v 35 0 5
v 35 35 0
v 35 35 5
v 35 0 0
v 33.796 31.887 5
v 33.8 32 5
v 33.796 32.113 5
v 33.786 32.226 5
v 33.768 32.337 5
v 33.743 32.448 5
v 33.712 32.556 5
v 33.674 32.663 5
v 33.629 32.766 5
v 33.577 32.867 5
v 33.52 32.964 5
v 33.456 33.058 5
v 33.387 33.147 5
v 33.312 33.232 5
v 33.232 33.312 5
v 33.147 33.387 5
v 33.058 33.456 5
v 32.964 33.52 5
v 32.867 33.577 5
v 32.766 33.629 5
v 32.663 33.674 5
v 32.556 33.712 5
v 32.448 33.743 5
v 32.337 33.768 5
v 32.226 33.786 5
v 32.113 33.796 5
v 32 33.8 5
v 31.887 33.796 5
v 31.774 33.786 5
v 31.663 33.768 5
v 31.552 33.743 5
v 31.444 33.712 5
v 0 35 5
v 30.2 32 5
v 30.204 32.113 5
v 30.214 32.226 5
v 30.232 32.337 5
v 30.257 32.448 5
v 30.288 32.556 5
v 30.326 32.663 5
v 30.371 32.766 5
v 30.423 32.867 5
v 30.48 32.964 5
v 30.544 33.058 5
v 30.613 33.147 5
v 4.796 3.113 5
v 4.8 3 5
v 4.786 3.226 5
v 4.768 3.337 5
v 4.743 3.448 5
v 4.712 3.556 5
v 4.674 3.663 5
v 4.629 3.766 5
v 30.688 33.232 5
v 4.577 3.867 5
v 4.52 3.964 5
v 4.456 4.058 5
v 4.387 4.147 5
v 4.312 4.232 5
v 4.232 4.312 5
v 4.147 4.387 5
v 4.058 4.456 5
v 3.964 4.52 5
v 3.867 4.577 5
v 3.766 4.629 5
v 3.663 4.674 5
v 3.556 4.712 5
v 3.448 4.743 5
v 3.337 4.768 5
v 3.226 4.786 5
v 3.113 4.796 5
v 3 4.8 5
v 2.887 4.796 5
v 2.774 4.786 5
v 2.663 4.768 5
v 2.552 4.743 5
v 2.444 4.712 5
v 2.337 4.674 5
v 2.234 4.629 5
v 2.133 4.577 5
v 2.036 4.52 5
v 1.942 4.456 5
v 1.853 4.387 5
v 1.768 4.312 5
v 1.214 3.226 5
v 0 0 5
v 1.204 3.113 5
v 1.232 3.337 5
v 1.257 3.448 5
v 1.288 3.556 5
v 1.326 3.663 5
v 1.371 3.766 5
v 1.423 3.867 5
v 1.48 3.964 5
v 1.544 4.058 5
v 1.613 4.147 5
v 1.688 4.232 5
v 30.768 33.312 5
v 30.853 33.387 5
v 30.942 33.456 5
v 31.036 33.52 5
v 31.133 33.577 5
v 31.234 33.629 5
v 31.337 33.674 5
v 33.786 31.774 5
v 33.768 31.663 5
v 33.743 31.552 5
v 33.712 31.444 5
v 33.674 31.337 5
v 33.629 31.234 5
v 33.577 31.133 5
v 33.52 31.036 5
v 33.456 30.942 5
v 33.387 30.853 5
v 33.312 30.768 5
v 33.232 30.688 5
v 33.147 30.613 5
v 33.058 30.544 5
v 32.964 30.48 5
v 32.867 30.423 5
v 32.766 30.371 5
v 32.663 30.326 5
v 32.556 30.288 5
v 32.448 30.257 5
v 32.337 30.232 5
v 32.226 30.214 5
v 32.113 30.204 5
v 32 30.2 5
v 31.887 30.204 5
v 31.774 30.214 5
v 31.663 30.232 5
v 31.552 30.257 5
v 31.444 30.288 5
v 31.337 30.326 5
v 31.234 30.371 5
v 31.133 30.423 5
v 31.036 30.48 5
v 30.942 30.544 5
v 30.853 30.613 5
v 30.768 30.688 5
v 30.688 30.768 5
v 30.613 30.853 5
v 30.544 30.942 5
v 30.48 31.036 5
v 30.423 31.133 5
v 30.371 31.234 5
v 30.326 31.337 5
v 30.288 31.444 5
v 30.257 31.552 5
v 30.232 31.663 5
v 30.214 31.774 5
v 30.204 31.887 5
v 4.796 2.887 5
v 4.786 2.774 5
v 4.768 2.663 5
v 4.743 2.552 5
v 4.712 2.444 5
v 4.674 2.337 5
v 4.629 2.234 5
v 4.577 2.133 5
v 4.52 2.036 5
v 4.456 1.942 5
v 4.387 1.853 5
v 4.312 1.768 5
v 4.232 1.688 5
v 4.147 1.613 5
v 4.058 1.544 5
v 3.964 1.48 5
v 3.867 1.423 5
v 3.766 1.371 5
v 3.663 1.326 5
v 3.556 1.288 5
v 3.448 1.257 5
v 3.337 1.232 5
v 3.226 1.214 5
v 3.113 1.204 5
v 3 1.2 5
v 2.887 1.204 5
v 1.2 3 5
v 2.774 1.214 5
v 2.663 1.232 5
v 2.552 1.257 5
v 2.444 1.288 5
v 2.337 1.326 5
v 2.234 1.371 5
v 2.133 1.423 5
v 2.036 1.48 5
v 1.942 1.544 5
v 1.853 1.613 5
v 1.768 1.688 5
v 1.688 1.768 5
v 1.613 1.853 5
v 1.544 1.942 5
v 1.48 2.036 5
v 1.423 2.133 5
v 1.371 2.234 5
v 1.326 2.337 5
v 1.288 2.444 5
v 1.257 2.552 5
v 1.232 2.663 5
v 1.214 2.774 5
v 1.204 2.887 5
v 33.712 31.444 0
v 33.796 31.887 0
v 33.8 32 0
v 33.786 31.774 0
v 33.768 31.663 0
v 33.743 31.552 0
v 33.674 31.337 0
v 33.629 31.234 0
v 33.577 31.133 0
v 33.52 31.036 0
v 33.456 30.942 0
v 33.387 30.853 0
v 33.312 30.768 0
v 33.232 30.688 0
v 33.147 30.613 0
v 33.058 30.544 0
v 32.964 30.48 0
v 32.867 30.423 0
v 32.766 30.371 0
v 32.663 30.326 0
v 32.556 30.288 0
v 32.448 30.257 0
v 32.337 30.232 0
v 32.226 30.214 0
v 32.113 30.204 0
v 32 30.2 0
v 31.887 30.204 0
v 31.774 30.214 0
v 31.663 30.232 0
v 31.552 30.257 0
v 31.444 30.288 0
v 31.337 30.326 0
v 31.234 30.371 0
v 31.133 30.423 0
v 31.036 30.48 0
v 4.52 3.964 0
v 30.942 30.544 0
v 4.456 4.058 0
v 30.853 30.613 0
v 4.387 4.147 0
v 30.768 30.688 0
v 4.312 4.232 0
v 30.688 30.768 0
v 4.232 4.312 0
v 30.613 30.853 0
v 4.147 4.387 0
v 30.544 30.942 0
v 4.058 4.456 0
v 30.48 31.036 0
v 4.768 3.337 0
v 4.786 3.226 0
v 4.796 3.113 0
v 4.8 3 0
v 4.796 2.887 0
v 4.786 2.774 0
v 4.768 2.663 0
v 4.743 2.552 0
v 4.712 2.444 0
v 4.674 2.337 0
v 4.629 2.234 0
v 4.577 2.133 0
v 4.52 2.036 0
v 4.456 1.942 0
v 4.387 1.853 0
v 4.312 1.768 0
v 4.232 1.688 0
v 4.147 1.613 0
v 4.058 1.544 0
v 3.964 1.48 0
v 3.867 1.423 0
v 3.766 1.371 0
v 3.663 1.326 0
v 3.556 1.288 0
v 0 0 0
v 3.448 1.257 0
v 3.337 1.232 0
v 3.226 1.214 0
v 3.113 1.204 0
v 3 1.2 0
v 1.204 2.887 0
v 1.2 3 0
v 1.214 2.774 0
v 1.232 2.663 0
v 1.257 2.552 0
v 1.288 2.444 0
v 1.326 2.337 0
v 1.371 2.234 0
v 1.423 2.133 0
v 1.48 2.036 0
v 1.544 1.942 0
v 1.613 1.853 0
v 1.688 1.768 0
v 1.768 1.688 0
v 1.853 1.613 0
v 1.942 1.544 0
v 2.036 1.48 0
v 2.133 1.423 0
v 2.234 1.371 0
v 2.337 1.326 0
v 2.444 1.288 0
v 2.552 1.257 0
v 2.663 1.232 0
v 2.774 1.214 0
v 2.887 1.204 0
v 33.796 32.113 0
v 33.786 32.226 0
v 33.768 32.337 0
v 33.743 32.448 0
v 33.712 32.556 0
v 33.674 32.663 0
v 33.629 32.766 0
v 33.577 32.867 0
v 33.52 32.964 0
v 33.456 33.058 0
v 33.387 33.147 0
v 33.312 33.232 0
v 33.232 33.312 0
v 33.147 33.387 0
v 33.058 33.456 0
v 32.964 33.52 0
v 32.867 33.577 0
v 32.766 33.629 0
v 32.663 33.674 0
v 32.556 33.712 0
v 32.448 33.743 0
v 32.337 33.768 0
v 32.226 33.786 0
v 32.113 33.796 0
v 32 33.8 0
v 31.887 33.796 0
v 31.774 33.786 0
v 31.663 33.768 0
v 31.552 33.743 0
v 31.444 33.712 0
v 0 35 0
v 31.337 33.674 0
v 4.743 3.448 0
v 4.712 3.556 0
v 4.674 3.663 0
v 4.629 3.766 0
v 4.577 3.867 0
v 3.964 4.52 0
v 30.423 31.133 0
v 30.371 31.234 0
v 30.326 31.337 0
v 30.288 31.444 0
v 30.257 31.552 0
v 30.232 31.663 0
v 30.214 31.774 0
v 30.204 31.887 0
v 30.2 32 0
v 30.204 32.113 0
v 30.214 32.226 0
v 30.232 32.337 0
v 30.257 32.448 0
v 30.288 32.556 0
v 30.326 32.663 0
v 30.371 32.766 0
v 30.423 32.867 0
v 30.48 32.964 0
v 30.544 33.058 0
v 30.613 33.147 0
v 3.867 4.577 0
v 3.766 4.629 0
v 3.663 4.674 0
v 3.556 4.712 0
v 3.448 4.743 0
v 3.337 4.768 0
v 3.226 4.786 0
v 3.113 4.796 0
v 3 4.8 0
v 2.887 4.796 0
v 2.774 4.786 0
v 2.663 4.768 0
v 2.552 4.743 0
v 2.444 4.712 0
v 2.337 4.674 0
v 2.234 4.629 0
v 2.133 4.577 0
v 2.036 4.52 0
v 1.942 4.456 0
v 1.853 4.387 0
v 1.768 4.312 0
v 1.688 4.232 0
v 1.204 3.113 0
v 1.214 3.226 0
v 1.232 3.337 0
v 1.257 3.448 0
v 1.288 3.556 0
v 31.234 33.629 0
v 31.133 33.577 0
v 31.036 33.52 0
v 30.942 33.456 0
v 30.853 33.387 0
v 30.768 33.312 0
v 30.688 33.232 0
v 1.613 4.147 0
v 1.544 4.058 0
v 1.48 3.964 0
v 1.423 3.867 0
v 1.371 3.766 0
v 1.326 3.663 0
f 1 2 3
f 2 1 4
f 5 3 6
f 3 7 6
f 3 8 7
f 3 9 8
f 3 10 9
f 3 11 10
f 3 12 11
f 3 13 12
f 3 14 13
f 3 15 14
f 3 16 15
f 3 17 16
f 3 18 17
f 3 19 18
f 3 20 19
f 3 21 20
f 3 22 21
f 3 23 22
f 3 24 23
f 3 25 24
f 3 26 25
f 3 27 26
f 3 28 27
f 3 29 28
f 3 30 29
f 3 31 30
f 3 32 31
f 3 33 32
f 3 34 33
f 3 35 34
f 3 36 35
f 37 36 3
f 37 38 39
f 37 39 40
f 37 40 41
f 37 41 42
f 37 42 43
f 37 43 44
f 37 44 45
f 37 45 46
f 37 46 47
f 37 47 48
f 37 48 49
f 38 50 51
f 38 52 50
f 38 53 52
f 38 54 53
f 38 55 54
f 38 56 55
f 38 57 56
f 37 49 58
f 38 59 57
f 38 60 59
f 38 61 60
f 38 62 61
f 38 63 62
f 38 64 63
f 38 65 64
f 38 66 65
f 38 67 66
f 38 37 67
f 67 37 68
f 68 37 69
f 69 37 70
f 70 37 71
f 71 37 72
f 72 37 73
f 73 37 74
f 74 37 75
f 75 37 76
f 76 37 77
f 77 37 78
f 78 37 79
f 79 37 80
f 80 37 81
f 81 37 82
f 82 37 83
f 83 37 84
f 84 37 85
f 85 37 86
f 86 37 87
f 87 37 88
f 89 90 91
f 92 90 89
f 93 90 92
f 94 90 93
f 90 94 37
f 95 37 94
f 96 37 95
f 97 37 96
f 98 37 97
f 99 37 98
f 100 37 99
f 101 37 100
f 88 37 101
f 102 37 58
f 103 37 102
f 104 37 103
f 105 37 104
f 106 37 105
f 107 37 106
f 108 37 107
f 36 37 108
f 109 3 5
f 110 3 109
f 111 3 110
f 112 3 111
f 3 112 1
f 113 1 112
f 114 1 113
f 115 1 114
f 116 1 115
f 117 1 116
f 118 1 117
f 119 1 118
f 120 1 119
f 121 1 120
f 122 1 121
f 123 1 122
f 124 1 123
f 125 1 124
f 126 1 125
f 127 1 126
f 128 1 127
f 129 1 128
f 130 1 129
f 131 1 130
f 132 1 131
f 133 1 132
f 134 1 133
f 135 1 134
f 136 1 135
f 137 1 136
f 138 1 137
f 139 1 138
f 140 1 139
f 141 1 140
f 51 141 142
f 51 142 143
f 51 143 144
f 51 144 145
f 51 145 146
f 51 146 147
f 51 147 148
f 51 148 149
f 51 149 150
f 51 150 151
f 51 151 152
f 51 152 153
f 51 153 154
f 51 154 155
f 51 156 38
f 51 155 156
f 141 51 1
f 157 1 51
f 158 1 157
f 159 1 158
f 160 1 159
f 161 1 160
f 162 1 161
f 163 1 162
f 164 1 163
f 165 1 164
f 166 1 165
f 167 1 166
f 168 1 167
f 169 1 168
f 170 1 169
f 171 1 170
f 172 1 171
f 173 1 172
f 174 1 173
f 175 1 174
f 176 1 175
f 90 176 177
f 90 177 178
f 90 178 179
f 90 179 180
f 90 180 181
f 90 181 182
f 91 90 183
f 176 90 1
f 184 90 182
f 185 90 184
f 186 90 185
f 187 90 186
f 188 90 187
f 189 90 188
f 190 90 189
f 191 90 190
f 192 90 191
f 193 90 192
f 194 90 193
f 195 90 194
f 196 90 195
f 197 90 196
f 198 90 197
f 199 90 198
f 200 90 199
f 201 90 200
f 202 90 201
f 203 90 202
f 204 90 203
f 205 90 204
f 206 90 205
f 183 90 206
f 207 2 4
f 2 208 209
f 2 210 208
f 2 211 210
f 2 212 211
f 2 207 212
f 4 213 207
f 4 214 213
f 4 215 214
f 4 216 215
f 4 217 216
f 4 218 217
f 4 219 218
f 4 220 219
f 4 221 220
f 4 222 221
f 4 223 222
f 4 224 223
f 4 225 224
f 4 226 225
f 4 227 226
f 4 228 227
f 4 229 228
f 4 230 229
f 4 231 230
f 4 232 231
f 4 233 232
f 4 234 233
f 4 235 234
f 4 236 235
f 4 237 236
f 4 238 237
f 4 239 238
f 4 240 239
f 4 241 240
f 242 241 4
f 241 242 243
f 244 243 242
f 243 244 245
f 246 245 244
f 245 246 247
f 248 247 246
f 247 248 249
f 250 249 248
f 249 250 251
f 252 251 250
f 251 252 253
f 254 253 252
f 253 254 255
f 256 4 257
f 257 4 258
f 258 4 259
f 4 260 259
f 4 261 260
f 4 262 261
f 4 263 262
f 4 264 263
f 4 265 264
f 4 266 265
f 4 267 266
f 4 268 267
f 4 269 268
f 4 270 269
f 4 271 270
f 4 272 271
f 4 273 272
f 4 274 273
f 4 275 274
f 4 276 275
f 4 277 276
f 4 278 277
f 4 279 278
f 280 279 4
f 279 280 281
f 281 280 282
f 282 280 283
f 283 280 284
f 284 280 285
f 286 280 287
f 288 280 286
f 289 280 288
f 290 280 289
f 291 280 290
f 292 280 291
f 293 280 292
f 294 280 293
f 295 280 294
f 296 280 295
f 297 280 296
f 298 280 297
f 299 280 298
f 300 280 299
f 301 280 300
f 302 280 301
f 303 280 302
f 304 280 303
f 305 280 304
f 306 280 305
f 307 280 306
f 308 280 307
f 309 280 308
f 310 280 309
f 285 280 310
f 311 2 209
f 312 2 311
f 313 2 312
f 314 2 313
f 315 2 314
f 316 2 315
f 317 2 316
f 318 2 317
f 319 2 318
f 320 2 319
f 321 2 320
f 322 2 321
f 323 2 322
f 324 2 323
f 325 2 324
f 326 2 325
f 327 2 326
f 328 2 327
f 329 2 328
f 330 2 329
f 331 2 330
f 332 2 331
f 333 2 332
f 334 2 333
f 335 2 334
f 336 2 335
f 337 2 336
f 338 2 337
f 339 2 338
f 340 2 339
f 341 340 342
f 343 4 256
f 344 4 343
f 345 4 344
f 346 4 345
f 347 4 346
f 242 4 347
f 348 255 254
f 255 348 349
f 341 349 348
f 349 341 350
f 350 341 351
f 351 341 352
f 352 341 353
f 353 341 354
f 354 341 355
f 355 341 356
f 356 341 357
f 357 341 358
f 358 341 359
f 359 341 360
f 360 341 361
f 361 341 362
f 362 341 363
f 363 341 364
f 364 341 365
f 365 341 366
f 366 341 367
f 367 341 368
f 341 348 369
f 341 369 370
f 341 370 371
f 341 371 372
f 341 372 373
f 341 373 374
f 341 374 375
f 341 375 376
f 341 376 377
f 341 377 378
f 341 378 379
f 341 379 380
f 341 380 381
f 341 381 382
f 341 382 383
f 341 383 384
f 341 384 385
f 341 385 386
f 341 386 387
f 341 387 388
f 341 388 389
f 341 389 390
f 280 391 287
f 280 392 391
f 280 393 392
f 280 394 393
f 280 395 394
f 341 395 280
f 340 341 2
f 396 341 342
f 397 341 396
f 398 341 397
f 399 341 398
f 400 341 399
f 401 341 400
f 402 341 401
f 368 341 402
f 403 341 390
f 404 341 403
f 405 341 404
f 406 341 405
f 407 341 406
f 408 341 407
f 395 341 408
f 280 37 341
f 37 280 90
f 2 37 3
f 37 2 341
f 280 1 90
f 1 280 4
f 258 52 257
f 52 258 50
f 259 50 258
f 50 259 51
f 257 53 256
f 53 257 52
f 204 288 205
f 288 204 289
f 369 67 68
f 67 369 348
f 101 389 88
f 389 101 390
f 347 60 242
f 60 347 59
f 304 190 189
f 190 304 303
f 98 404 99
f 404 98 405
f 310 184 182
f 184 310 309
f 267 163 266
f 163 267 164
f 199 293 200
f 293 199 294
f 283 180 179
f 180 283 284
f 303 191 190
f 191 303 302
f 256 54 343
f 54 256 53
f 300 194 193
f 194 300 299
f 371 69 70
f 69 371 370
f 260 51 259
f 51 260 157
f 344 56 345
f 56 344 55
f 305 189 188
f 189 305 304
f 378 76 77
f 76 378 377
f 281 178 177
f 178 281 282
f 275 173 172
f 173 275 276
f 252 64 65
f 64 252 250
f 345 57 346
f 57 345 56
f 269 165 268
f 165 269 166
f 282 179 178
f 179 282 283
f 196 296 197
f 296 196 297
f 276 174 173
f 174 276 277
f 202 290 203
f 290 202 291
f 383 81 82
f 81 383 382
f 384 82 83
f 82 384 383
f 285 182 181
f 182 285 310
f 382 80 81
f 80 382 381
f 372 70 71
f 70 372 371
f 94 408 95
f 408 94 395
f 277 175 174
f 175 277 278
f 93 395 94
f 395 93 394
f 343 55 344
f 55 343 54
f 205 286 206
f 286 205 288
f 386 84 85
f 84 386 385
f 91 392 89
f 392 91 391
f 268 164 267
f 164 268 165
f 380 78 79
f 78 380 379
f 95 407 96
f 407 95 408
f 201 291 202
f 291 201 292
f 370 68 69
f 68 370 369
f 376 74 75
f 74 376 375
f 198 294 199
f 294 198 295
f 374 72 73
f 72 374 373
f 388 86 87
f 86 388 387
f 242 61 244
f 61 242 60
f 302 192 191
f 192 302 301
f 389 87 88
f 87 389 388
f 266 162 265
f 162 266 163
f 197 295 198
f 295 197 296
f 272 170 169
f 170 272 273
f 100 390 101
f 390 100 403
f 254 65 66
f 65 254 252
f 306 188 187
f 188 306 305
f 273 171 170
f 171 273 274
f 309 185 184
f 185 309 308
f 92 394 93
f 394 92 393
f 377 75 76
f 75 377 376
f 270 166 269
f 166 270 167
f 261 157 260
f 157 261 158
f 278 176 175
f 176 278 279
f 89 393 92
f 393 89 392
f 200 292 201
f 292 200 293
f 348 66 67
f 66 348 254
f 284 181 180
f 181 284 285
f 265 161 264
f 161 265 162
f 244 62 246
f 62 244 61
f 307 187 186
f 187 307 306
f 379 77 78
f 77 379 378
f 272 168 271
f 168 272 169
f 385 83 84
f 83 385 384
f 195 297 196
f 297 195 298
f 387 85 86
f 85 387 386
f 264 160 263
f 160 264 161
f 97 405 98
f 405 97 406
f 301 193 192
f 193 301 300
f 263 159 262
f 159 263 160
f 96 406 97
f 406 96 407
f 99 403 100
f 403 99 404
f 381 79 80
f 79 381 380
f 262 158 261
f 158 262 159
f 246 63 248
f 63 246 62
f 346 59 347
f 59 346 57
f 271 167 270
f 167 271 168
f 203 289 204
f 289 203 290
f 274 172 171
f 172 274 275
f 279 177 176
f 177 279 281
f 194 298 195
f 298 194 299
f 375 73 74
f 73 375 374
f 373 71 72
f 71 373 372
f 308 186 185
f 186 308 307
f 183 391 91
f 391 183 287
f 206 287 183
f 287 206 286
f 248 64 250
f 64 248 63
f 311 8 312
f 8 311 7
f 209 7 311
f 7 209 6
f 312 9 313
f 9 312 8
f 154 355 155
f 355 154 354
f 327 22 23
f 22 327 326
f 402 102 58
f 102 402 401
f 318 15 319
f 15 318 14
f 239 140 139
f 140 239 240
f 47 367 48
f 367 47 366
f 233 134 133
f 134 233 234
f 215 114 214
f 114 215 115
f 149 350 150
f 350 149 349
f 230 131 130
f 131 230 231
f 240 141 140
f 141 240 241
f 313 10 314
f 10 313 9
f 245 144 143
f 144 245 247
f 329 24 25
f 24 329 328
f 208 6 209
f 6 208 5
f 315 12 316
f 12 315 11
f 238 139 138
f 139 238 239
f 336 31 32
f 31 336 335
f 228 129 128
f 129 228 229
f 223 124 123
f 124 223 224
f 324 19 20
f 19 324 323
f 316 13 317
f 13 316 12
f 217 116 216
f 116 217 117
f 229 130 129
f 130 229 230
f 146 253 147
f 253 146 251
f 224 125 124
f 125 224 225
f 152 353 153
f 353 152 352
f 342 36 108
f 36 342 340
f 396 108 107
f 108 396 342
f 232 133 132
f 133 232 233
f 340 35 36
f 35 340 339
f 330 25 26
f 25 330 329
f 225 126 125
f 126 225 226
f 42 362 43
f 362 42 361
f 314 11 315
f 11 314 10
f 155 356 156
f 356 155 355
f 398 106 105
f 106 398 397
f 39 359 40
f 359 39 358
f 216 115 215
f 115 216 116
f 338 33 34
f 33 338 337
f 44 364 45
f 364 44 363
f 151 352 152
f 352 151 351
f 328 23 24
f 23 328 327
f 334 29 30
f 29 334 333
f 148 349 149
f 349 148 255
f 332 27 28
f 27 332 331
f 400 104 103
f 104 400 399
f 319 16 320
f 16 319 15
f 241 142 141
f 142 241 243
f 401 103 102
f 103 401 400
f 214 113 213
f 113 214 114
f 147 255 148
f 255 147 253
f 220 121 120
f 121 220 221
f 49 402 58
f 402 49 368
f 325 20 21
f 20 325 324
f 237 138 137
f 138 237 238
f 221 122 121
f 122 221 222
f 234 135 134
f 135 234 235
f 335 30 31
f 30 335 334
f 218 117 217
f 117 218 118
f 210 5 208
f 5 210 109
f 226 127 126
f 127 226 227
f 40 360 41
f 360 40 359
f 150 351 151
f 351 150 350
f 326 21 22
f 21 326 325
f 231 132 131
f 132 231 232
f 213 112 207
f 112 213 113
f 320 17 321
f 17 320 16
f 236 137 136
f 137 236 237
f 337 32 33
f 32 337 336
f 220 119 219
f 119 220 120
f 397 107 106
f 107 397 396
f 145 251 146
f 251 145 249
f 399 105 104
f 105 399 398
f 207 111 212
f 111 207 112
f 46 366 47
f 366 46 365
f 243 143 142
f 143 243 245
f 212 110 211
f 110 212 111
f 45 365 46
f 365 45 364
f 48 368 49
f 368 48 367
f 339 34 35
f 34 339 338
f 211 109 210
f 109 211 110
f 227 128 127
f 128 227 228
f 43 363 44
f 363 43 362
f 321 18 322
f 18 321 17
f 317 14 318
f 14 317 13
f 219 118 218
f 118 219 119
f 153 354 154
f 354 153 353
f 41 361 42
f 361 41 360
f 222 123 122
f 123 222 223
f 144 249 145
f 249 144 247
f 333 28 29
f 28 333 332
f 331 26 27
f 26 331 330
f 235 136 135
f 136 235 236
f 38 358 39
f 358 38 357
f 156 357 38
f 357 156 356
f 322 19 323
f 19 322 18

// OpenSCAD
module base_board(l,w,h) {
  cube([l,w,h]);
}

module pcb_baseboard(l, w, h, x1, y1, x2, y2 ) {
difference() {
    base_board(l,w,h);
    translate([x1,y1,0]) cylinder(h=12, r = 1.8, center = true,  $fn=100); 
    translate([x2,y2,0]) cylinder(h=12, r = 1.8, center = true,  $fn=100); 

}    
}

pcb_baseboard(35,35, 5, 3,3, 32, 32);
//https://www.mcmaster.com/#94510a360/=1c12kfx
